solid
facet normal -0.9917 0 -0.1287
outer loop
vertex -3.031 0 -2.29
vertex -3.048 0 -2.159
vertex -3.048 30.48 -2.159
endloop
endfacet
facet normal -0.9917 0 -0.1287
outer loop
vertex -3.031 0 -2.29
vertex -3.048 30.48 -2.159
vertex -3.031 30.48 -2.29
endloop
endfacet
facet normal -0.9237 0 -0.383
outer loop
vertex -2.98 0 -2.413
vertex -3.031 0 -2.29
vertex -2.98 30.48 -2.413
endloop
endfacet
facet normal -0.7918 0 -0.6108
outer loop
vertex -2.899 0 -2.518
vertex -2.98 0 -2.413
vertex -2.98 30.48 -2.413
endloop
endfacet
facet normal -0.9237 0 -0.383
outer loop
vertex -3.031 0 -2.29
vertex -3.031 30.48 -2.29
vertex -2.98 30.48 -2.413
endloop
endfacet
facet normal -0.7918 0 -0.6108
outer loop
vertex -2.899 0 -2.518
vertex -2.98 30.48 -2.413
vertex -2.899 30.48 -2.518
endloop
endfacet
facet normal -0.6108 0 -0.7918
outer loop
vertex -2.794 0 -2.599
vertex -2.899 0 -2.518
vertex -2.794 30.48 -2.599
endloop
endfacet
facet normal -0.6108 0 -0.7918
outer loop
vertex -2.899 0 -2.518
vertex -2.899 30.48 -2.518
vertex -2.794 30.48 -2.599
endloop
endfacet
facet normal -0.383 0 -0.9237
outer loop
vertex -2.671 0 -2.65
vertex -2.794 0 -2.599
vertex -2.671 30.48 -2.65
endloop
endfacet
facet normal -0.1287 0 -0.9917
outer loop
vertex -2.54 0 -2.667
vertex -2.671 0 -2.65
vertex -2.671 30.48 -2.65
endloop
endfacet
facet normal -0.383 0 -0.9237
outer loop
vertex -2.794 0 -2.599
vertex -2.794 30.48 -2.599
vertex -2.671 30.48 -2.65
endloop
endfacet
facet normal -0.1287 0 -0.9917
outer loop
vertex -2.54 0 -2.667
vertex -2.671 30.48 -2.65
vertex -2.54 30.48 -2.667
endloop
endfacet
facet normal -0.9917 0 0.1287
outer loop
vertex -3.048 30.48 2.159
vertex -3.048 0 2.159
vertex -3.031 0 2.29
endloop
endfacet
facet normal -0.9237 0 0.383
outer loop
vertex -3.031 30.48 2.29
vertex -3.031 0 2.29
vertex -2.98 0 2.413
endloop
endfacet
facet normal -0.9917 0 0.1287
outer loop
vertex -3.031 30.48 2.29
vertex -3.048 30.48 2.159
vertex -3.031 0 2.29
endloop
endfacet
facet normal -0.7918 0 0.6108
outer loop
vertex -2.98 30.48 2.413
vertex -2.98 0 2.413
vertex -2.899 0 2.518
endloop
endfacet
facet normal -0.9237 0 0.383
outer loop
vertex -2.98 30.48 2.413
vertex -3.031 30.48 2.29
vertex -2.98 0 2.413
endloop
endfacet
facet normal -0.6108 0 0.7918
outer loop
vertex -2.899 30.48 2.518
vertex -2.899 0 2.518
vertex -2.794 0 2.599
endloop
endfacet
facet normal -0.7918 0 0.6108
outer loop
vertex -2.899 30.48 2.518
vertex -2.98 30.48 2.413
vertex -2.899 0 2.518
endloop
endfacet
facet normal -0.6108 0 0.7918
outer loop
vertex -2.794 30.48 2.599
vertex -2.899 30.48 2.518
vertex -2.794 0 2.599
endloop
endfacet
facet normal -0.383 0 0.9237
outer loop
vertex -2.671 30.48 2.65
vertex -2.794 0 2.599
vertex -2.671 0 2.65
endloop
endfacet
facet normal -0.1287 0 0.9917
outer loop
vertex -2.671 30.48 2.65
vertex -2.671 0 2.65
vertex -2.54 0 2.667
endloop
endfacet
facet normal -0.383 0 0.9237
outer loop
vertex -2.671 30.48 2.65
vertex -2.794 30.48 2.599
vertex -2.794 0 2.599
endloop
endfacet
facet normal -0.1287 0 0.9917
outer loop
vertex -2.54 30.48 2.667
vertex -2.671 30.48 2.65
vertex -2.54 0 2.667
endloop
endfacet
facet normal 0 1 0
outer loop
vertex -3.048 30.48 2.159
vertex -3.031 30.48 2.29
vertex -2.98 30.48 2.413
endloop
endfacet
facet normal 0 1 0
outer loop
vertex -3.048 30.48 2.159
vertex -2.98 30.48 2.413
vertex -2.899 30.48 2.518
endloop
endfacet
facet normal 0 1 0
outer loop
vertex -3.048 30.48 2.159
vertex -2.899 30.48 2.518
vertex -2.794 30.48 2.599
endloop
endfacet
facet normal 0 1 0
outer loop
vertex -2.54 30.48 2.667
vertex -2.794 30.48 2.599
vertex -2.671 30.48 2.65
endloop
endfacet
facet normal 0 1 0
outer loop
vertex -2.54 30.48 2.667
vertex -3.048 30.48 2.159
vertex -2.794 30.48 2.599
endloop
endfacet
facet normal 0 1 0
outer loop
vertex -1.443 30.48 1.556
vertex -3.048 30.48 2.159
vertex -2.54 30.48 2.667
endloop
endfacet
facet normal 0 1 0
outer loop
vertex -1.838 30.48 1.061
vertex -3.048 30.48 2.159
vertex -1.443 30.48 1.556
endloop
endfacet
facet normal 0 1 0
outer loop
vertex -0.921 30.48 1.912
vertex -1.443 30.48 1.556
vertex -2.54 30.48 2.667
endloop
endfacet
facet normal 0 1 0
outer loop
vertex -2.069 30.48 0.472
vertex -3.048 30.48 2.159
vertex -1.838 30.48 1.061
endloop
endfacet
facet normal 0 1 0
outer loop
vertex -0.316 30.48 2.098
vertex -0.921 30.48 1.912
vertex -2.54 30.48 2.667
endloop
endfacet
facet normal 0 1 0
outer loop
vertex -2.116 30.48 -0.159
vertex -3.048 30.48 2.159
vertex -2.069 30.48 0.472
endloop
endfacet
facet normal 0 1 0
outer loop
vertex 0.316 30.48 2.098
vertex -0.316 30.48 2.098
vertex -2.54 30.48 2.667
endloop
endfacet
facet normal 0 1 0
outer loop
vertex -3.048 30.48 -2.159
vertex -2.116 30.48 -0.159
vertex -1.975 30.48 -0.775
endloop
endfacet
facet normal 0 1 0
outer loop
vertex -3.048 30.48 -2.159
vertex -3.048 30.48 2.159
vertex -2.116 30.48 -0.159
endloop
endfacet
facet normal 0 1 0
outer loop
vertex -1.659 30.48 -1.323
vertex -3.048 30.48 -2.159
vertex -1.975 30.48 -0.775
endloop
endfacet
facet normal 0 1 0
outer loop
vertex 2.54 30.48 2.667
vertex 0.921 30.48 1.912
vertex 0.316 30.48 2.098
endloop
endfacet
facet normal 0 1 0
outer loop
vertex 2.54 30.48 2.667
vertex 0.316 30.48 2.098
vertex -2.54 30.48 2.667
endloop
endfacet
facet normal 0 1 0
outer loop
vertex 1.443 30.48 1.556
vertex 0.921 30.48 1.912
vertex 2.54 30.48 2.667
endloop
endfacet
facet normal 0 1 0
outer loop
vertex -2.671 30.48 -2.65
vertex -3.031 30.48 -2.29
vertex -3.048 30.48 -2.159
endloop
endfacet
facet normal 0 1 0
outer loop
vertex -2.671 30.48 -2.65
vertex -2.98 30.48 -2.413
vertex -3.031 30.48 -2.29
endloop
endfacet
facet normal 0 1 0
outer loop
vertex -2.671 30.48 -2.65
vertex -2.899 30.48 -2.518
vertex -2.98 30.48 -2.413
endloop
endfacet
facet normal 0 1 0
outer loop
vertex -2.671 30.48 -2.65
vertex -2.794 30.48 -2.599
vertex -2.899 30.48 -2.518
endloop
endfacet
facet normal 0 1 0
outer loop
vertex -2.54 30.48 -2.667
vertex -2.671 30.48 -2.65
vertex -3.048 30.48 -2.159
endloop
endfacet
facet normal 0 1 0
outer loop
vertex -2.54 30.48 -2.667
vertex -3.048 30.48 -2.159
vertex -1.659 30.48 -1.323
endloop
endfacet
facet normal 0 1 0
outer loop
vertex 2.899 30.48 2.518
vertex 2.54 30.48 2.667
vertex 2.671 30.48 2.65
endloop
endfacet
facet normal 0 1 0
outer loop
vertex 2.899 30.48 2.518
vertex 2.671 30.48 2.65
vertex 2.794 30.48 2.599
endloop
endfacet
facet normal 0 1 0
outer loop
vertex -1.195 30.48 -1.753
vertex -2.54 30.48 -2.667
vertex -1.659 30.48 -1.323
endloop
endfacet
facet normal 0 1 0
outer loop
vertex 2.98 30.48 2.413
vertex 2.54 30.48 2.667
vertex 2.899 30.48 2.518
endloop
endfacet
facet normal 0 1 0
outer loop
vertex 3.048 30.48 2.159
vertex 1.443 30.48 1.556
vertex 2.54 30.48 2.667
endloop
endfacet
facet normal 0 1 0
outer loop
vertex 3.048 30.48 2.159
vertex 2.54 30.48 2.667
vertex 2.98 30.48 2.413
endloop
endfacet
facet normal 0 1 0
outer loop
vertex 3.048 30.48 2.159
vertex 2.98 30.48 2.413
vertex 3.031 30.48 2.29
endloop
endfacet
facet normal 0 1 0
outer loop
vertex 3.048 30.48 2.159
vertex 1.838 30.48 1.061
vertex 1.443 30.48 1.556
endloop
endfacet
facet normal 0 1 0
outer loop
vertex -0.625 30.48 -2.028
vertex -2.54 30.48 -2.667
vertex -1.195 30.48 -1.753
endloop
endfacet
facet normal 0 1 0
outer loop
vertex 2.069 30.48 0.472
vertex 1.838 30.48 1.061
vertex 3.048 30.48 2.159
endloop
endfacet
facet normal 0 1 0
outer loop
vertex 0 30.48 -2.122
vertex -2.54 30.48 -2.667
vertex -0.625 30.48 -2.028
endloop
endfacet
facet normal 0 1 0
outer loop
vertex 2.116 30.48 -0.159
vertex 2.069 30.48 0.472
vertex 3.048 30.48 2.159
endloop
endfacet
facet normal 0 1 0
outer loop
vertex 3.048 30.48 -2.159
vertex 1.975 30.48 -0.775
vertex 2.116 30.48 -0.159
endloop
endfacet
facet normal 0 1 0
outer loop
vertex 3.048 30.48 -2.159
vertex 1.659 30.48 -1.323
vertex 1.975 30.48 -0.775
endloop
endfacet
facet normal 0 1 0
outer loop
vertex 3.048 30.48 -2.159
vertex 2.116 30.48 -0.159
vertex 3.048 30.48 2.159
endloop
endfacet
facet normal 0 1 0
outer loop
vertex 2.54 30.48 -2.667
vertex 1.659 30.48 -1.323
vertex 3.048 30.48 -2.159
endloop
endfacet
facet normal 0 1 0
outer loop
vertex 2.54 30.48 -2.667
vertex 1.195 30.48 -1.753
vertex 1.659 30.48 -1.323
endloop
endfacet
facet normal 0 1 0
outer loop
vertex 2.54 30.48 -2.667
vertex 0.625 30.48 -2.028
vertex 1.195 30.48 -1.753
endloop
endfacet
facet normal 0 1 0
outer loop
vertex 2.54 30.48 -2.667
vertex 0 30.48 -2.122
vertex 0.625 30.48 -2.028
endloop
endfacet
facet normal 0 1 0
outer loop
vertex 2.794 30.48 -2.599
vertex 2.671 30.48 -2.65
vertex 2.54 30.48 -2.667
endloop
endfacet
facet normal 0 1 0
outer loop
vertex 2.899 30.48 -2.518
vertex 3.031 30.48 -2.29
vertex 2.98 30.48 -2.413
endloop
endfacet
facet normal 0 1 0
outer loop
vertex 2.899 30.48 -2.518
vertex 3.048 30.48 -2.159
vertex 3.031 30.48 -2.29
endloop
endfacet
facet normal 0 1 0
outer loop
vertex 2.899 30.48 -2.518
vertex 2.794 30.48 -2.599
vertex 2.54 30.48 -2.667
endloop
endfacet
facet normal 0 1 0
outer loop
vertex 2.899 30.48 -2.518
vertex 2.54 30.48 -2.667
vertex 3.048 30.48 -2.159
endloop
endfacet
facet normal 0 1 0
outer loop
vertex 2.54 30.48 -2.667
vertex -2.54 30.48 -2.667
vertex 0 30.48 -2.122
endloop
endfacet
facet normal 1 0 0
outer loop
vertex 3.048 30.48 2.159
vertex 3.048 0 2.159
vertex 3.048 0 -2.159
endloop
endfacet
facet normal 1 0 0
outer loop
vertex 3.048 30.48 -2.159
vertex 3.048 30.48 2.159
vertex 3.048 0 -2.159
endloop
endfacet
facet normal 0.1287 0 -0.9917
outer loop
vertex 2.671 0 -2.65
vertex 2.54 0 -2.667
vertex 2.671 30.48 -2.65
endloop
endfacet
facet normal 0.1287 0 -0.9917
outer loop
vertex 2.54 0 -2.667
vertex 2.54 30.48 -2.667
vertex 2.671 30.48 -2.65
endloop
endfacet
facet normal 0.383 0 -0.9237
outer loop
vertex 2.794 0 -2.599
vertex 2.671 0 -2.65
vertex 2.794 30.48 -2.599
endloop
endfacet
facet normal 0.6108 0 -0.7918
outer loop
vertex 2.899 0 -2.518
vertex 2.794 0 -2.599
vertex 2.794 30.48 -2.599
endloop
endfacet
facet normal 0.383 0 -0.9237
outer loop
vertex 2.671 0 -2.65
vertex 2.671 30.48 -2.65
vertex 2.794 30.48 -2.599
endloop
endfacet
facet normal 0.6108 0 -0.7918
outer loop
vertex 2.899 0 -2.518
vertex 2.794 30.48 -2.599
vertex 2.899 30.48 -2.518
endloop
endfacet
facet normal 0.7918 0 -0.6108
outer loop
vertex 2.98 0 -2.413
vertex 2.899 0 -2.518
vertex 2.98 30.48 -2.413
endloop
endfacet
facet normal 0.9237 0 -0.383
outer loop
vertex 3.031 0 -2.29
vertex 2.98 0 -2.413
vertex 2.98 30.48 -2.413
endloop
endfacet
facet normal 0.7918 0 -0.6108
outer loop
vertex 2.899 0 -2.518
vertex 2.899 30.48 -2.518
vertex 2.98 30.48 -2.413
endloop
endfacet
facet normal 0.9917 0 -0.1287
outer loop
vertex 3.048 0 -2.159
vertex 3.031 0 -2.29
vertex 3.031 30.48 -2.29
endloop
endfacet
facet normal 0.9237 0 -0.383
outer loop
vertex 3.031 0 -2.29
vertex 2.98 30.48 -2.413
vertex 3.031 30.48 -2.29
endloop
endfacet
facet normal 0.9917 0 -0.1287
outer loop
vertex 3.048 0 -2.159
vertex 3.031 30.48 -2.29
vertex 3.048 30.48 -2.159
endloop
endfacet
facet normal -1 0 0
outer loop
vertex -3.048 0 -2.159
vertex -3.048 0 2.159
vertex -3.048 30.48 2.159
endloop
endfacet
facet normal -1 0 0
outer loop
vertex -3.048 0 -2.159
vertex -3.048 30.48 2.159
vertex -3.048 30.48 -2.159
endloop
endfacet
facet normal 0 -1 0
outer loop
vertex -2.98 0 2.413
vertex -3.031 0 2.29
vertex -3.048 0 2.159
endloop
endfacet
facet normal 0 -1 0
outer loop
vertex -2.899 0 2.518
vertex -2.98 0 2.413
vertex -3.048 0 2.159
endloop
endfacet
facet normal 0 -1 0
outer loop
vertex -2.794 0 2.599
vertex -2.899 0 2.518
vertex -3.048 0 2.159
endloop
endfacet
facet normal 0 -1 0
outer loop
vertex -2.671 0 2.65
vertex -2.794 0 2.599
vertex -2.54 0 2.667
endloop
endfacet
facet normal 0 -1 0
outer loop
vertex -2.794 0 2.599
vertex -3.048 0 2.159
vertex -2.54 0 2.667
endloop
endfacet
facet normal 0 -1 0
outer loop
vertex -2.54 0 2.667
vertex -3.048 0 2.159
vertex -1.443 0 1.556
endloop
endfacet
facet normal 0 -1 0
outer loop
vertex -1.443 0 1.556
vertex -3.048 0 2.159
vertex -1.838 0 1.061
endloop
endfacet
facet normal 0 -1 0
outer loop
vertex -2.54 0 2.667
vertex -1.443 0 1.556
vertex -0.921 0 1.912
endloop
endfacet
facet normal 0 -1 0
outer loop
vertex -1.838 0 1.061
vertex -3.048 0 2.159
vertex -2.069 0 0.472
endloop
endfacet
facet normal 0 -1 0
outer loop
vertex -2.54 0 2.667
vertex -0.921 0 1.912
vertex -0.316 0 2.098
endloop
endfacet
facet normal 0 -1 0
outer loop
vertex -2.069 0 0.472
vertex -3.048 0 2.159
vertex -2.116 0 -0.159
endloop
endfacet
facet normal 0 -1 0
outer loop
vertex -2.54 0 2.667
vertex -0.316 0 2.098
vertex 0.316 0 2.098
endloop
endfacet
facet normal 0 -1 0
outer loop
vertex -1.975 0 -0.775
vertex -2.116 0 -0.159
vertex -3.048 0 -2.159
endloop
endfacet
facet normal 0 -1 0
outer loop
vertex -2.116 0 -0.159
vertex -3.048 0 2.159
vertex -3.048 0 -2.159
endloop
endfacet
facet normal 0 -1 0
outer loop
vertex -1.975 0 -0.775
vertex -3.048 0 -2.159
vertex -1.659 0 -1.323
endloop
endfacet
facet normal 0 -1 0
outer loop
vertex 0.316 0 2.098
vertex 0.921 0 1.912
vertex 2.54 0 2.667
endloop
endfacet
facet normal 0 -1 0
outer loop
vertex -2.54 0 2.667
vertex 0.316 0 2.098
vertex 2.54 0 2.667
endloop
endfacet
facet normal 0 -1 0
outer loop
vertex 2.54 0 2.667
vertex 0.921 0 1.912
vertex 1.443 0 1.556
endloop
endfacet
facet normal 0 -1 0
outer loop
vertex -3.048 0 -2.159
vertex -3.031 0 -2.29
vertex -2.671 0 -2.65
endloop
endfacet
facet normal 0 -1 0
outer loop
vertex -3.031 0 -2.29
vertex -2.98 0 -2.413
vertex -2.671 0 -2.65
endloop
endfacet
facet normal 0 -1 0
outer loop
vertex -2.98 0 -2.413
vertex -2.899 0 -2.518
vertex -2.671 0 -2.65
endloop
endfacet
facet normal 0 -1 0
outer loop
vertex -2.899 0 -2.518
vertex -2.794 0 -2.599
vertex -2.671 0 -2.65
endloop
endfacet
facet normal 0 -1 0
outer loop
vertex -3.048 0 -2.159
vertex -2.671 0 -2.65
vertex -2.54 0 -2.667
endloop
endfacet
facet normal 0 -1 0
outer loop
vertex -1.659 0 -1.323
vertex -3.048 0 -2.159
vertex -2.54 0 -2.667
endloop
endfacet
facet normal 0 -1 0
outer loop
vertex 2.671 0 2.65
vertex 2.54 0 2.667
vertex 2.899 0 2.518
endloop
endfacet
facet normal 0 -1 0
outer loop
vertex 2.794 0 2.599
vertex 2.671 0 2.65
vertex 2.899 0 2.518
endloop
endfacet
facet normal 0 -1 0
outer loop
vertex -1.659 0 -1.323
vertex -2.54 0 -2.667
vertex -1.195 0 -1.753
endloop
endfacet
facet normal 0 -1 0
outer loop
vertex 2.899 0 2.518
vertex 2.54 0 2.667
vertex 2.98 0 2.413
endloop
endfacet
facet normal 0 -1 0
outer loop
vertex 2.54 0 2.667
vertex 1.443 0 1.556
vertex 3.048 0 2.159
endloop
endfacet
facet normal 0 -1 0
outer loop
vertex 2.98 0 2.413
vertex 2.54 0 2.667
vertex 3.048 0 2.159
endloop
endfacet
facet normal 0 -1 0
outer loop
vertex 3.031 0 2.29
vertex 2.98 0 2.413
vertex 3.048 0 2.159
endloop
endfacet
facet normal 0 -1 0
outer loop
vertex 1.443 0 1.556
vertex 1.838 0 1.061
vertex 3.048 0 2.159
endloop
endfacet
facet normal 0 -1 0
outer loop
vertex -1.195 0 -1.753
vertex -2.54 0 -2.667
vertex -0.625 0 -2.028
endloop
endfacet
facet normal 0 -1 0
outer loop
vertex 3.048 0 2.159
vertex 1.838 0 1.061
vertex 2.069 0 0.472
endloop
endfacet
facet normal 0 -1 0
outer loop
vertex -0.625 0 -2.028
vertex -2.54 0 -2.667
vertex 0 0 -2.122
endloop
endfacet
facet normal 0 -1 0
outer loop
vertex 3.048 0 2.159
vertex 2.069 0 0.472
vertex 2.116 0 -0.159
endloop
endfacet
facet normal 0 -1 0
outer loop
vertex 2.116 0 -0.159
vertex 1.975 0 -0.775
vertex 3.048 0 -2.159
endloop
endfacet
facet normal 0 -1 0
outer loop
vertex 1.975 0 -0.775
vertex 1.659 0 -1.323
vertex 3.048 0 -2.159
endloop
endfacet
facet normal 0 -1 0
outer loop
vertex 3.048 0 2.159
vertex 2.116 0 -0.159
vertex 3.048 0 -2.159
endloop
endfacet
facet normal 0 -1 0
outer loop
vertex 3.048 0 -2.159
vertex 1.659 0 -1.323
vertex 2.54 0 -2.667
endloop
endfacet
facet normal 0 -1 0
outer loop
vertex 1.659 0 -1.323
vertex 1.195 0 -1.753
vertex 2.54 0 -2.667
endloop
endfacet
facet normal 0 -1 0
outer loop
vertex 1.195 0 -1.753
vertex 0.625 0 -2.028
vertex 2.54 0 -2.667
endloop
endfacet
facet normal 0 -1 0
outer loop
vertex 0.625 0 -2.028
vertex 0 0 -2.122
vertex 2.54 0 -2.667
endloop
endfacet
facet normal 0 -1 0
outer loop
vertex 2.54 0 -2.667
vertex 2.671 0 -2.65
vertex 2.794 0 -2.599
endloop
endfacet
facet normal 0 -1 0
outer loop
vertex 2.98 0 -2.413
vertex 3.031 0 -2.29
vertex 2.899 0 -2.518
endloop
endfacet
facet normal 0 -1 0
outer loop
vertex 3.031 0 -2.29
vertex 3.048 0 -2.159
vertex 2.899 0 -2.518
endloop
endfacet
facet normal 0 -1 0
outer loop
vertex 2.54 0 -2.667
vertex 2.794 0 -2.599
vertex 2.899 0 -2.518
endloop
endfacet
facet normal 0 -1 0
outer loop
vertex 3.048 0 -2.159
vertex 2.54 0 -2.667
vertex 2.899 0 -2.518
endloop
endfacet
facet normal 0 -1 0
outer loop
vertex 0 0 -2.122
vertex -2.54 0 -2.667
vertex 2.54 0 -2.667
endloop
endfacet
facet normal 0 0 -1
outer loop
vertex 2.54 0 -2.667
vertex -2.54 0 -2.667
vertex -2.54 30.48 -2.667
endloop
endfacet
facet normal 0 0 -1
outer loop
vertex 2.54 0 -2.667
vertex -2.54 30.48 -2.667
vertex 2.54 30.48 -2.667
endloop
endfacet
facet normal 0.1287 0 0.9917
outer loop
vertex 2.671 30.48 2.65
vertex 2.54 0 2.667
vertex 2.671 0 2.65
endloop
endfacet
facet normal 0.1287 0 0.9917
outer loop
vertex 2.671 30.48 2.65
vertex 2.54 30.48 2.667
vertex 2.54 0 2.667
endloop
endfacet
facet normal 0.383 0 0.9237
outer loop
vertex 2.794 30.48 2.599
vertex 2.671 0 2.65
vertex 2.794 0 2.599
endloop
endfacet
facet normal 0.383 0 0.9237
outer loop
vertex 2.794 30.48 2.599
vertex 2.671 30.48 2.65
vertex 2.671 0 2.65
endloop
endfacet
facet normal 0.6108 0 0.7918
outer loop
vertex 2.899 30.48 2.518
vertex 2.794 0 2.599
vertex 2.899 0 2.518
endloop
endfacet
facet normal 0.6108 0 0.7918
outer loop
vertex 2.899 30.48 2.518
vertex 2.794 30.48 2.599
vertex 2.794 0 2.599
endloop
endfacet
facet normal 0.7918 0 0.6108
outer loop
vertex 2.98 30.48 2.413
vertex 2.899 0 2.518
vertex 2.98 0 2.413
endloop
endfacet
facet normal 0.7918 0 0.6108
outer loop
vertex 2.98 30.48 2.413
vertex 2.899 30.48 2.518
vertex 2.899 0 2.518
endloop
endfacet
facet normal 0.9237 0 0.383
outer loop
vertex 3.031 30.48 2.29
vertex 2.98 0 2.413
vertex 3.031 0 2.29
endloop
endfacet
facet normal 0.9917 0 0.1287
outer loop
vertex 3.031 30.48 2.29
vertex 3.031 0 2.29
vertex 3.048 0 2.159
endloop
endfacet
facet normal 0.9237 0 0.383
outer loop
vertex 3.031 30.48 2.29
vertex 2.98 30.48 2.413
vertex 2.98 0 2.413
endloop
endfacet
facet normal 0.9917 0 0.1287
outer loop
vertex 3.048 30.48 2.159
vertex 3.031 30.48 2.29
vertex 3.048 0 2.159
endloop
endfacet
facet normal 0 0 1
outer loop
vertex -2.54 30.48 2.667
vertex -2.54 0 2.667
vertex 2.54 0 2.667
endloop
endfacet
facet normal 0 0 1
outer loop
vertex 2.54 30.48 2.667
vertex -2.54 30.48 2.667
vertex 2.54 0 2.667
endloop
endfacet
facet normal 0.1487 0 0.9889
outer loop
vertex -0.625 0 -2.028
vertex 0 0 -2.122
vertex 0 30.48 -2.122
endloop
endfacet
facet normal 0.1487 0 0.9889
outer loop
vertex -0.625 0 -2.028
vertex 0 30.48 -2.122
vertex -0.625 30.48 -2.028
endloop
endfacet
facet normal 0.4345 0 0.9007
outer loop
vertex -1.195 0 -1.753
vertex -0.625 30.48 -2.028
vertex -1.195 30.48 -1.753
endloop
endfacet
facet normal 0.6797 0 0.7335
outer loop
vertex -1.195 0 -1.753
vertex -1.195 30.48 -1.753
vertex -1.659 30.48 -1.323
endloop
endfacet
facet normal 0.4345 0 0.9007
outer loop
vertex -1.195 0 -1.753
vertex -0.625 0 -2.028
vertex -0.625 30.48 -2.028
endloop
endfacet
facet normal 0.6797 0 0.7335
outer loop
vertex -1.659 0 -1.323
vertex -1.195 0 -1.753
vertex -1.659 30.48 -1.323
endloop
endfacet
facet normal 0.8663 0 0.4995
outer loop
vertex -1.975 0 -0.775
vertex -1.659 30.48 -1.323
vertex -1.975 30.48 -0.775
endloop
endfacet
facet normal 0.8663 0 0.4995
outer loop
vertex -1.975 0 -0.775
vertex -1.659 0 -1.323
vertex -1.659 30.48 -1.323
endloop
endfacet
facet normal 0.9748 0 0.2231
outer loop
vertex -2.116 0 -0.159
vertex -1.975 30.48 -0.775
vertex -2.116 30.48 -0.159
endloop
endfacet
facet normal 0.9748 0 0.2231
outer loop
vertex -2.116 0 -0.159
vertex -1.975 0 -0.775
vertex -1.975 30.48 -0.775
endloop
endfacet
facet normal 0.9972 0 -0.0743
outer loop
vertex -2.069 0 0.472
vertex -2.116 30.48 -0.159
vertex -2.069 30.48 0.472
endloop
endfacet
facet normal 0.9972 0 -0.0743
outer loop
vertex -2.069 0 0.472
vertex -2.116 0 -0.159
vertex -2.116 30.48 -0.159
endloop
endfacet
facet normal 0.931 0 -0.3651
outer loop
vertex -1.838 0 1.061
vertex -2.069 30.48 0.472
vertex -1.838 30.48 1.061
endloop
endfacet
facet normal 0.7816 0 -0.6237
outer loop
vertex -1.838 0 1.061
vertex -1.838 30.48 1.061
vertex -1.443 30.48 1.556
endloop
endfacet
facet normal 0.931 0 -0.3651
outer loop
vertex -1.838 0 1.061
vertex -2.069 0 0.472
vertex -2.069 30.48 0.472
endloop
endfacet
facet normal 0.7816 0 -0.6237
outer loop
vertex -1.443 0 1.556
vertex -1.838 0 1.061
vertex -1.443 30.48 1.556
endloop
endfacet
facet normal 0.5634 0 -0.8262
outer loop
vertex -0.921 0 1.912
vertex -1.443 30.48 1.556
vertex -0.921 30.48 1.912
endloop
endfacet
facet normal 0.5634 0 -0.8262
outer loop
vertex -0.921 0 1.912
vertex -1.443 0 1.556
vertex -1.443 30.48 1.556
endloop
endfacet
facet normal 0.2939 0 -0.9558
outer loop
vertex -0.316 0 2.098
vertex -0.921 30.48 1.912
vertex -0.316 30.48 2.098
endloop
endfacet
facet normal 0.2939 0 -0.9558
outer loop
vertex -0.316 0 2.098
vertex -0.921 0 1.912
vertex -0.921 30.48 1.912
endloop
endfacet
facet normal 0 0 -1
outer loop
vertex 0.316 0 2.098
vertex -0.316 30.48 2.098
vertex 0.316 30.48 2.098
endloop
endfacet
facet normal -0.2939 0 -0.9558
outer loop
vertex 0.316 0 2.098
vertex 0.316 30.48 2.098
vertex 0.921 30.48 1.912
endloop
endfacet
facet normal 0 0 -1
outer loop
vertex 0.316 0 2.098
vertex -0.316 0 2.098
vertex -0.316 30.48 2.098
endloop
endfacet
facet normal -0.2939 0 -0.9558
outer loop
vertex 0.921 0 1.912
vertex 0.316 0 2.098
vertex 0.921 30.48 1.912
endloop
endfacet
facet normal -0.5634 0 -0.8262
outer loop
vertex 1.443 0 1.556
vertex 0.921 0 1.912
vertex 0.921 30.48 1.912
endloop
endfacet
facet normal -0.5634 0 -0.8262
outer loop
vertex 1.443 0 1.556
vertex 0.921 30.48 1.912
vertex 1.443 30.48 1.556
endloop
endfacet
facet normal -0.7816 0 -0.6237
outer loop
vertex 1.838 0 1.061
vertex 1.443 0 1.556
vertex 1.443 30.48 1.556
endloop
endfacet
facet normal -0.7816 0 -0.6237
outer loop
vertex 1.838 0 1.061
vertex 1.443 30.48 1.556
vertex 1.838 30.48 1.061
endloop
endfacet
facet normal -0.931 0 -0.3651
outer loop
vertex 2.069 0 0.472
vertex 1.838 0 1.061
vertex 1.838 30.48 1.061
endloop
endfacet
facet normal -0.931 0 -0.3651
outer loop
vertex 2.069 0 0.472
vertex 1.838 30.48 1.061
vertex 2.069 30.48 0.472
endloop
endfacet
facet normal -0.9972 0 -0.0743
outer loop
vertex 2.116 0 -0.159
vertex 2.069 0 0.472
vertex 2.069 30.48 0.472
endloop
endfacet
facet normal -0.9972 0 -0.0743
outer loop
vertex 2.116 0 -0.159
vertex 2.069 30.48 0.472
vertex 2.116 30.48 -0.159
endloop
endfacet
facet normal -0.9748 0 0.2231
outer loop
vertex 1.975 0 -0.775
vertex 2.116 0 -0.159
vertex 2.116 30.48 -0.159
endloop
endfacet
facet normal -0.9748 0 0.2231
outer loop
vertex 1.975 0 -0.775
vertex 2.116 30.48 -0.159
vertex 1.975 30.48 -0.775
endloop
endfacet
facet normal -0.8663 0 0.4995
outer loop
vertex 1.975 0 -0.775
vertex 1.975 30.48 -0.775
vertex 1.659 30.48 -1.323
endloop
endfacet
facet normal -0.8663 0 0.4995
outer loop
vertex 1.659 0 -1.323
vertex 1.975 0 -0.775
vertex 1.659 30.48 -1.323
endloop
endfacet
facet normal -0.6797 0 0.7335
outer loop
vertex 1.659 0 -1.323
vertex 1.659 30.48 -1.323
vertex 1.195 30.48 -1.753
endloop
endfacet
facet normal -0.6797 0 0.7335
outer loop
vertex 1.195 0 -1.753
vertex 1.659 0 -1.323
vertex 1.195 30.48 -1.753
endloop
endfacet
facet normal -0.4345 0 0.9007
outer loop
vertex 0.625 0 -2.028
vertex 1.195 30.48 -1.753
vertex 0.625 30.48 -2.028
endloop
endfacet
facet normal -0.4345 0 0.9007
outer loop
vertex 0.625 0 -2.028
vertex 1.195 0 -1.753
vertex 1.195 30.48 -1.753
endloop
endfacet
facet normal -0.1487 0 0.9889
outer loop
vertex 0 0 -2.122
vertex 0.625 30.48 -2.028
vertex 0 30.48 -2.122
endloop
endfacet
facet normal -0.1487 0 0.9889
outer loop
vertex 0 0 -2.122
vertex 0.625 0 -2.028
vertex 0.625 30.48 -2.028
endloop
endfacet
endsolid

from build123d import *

# Parameters (mm, degrees)
SKETCH1_W           = 6.096
SKETCH1_H           = 5.334
SKETCH1_R           = 2.122
BOSS_EXTRUDE1_DEPTH = 30.48
FILLET1_R           = 0.508


with BuildPart() as part:
    # Sketch1 → Boss-Extrude1 (new body)
    with BuildSketch(Plane(origin=(0, 0, 0), x_dir=(1, 0, 0), z_dir=(0, 1, 0))):
        Rectangle(SKETCH1_W, SKETCH1_H)
        with Locations(Location((0, 0, 0), (0, 0, 90))):
            Circle(SKETCH1_R, mode=Mode.SUBTRACT)
    extrude(amount=BOSS_EXTRUDE1_DEPTH)

    # Fillet1
    fillet1_edges = [part.edges().sort_by_distance(p)[0] for p in [
        (3.048, 15.24, 2.667),
        (-3.048, 15.24, 2.667),
        (-3.048, 15.24, -2.667),
        (3.048, 15.24, -2.667),
    ]]
    fillet(fillet1_edges, radius=FILLET1_R)


solid = part.part
